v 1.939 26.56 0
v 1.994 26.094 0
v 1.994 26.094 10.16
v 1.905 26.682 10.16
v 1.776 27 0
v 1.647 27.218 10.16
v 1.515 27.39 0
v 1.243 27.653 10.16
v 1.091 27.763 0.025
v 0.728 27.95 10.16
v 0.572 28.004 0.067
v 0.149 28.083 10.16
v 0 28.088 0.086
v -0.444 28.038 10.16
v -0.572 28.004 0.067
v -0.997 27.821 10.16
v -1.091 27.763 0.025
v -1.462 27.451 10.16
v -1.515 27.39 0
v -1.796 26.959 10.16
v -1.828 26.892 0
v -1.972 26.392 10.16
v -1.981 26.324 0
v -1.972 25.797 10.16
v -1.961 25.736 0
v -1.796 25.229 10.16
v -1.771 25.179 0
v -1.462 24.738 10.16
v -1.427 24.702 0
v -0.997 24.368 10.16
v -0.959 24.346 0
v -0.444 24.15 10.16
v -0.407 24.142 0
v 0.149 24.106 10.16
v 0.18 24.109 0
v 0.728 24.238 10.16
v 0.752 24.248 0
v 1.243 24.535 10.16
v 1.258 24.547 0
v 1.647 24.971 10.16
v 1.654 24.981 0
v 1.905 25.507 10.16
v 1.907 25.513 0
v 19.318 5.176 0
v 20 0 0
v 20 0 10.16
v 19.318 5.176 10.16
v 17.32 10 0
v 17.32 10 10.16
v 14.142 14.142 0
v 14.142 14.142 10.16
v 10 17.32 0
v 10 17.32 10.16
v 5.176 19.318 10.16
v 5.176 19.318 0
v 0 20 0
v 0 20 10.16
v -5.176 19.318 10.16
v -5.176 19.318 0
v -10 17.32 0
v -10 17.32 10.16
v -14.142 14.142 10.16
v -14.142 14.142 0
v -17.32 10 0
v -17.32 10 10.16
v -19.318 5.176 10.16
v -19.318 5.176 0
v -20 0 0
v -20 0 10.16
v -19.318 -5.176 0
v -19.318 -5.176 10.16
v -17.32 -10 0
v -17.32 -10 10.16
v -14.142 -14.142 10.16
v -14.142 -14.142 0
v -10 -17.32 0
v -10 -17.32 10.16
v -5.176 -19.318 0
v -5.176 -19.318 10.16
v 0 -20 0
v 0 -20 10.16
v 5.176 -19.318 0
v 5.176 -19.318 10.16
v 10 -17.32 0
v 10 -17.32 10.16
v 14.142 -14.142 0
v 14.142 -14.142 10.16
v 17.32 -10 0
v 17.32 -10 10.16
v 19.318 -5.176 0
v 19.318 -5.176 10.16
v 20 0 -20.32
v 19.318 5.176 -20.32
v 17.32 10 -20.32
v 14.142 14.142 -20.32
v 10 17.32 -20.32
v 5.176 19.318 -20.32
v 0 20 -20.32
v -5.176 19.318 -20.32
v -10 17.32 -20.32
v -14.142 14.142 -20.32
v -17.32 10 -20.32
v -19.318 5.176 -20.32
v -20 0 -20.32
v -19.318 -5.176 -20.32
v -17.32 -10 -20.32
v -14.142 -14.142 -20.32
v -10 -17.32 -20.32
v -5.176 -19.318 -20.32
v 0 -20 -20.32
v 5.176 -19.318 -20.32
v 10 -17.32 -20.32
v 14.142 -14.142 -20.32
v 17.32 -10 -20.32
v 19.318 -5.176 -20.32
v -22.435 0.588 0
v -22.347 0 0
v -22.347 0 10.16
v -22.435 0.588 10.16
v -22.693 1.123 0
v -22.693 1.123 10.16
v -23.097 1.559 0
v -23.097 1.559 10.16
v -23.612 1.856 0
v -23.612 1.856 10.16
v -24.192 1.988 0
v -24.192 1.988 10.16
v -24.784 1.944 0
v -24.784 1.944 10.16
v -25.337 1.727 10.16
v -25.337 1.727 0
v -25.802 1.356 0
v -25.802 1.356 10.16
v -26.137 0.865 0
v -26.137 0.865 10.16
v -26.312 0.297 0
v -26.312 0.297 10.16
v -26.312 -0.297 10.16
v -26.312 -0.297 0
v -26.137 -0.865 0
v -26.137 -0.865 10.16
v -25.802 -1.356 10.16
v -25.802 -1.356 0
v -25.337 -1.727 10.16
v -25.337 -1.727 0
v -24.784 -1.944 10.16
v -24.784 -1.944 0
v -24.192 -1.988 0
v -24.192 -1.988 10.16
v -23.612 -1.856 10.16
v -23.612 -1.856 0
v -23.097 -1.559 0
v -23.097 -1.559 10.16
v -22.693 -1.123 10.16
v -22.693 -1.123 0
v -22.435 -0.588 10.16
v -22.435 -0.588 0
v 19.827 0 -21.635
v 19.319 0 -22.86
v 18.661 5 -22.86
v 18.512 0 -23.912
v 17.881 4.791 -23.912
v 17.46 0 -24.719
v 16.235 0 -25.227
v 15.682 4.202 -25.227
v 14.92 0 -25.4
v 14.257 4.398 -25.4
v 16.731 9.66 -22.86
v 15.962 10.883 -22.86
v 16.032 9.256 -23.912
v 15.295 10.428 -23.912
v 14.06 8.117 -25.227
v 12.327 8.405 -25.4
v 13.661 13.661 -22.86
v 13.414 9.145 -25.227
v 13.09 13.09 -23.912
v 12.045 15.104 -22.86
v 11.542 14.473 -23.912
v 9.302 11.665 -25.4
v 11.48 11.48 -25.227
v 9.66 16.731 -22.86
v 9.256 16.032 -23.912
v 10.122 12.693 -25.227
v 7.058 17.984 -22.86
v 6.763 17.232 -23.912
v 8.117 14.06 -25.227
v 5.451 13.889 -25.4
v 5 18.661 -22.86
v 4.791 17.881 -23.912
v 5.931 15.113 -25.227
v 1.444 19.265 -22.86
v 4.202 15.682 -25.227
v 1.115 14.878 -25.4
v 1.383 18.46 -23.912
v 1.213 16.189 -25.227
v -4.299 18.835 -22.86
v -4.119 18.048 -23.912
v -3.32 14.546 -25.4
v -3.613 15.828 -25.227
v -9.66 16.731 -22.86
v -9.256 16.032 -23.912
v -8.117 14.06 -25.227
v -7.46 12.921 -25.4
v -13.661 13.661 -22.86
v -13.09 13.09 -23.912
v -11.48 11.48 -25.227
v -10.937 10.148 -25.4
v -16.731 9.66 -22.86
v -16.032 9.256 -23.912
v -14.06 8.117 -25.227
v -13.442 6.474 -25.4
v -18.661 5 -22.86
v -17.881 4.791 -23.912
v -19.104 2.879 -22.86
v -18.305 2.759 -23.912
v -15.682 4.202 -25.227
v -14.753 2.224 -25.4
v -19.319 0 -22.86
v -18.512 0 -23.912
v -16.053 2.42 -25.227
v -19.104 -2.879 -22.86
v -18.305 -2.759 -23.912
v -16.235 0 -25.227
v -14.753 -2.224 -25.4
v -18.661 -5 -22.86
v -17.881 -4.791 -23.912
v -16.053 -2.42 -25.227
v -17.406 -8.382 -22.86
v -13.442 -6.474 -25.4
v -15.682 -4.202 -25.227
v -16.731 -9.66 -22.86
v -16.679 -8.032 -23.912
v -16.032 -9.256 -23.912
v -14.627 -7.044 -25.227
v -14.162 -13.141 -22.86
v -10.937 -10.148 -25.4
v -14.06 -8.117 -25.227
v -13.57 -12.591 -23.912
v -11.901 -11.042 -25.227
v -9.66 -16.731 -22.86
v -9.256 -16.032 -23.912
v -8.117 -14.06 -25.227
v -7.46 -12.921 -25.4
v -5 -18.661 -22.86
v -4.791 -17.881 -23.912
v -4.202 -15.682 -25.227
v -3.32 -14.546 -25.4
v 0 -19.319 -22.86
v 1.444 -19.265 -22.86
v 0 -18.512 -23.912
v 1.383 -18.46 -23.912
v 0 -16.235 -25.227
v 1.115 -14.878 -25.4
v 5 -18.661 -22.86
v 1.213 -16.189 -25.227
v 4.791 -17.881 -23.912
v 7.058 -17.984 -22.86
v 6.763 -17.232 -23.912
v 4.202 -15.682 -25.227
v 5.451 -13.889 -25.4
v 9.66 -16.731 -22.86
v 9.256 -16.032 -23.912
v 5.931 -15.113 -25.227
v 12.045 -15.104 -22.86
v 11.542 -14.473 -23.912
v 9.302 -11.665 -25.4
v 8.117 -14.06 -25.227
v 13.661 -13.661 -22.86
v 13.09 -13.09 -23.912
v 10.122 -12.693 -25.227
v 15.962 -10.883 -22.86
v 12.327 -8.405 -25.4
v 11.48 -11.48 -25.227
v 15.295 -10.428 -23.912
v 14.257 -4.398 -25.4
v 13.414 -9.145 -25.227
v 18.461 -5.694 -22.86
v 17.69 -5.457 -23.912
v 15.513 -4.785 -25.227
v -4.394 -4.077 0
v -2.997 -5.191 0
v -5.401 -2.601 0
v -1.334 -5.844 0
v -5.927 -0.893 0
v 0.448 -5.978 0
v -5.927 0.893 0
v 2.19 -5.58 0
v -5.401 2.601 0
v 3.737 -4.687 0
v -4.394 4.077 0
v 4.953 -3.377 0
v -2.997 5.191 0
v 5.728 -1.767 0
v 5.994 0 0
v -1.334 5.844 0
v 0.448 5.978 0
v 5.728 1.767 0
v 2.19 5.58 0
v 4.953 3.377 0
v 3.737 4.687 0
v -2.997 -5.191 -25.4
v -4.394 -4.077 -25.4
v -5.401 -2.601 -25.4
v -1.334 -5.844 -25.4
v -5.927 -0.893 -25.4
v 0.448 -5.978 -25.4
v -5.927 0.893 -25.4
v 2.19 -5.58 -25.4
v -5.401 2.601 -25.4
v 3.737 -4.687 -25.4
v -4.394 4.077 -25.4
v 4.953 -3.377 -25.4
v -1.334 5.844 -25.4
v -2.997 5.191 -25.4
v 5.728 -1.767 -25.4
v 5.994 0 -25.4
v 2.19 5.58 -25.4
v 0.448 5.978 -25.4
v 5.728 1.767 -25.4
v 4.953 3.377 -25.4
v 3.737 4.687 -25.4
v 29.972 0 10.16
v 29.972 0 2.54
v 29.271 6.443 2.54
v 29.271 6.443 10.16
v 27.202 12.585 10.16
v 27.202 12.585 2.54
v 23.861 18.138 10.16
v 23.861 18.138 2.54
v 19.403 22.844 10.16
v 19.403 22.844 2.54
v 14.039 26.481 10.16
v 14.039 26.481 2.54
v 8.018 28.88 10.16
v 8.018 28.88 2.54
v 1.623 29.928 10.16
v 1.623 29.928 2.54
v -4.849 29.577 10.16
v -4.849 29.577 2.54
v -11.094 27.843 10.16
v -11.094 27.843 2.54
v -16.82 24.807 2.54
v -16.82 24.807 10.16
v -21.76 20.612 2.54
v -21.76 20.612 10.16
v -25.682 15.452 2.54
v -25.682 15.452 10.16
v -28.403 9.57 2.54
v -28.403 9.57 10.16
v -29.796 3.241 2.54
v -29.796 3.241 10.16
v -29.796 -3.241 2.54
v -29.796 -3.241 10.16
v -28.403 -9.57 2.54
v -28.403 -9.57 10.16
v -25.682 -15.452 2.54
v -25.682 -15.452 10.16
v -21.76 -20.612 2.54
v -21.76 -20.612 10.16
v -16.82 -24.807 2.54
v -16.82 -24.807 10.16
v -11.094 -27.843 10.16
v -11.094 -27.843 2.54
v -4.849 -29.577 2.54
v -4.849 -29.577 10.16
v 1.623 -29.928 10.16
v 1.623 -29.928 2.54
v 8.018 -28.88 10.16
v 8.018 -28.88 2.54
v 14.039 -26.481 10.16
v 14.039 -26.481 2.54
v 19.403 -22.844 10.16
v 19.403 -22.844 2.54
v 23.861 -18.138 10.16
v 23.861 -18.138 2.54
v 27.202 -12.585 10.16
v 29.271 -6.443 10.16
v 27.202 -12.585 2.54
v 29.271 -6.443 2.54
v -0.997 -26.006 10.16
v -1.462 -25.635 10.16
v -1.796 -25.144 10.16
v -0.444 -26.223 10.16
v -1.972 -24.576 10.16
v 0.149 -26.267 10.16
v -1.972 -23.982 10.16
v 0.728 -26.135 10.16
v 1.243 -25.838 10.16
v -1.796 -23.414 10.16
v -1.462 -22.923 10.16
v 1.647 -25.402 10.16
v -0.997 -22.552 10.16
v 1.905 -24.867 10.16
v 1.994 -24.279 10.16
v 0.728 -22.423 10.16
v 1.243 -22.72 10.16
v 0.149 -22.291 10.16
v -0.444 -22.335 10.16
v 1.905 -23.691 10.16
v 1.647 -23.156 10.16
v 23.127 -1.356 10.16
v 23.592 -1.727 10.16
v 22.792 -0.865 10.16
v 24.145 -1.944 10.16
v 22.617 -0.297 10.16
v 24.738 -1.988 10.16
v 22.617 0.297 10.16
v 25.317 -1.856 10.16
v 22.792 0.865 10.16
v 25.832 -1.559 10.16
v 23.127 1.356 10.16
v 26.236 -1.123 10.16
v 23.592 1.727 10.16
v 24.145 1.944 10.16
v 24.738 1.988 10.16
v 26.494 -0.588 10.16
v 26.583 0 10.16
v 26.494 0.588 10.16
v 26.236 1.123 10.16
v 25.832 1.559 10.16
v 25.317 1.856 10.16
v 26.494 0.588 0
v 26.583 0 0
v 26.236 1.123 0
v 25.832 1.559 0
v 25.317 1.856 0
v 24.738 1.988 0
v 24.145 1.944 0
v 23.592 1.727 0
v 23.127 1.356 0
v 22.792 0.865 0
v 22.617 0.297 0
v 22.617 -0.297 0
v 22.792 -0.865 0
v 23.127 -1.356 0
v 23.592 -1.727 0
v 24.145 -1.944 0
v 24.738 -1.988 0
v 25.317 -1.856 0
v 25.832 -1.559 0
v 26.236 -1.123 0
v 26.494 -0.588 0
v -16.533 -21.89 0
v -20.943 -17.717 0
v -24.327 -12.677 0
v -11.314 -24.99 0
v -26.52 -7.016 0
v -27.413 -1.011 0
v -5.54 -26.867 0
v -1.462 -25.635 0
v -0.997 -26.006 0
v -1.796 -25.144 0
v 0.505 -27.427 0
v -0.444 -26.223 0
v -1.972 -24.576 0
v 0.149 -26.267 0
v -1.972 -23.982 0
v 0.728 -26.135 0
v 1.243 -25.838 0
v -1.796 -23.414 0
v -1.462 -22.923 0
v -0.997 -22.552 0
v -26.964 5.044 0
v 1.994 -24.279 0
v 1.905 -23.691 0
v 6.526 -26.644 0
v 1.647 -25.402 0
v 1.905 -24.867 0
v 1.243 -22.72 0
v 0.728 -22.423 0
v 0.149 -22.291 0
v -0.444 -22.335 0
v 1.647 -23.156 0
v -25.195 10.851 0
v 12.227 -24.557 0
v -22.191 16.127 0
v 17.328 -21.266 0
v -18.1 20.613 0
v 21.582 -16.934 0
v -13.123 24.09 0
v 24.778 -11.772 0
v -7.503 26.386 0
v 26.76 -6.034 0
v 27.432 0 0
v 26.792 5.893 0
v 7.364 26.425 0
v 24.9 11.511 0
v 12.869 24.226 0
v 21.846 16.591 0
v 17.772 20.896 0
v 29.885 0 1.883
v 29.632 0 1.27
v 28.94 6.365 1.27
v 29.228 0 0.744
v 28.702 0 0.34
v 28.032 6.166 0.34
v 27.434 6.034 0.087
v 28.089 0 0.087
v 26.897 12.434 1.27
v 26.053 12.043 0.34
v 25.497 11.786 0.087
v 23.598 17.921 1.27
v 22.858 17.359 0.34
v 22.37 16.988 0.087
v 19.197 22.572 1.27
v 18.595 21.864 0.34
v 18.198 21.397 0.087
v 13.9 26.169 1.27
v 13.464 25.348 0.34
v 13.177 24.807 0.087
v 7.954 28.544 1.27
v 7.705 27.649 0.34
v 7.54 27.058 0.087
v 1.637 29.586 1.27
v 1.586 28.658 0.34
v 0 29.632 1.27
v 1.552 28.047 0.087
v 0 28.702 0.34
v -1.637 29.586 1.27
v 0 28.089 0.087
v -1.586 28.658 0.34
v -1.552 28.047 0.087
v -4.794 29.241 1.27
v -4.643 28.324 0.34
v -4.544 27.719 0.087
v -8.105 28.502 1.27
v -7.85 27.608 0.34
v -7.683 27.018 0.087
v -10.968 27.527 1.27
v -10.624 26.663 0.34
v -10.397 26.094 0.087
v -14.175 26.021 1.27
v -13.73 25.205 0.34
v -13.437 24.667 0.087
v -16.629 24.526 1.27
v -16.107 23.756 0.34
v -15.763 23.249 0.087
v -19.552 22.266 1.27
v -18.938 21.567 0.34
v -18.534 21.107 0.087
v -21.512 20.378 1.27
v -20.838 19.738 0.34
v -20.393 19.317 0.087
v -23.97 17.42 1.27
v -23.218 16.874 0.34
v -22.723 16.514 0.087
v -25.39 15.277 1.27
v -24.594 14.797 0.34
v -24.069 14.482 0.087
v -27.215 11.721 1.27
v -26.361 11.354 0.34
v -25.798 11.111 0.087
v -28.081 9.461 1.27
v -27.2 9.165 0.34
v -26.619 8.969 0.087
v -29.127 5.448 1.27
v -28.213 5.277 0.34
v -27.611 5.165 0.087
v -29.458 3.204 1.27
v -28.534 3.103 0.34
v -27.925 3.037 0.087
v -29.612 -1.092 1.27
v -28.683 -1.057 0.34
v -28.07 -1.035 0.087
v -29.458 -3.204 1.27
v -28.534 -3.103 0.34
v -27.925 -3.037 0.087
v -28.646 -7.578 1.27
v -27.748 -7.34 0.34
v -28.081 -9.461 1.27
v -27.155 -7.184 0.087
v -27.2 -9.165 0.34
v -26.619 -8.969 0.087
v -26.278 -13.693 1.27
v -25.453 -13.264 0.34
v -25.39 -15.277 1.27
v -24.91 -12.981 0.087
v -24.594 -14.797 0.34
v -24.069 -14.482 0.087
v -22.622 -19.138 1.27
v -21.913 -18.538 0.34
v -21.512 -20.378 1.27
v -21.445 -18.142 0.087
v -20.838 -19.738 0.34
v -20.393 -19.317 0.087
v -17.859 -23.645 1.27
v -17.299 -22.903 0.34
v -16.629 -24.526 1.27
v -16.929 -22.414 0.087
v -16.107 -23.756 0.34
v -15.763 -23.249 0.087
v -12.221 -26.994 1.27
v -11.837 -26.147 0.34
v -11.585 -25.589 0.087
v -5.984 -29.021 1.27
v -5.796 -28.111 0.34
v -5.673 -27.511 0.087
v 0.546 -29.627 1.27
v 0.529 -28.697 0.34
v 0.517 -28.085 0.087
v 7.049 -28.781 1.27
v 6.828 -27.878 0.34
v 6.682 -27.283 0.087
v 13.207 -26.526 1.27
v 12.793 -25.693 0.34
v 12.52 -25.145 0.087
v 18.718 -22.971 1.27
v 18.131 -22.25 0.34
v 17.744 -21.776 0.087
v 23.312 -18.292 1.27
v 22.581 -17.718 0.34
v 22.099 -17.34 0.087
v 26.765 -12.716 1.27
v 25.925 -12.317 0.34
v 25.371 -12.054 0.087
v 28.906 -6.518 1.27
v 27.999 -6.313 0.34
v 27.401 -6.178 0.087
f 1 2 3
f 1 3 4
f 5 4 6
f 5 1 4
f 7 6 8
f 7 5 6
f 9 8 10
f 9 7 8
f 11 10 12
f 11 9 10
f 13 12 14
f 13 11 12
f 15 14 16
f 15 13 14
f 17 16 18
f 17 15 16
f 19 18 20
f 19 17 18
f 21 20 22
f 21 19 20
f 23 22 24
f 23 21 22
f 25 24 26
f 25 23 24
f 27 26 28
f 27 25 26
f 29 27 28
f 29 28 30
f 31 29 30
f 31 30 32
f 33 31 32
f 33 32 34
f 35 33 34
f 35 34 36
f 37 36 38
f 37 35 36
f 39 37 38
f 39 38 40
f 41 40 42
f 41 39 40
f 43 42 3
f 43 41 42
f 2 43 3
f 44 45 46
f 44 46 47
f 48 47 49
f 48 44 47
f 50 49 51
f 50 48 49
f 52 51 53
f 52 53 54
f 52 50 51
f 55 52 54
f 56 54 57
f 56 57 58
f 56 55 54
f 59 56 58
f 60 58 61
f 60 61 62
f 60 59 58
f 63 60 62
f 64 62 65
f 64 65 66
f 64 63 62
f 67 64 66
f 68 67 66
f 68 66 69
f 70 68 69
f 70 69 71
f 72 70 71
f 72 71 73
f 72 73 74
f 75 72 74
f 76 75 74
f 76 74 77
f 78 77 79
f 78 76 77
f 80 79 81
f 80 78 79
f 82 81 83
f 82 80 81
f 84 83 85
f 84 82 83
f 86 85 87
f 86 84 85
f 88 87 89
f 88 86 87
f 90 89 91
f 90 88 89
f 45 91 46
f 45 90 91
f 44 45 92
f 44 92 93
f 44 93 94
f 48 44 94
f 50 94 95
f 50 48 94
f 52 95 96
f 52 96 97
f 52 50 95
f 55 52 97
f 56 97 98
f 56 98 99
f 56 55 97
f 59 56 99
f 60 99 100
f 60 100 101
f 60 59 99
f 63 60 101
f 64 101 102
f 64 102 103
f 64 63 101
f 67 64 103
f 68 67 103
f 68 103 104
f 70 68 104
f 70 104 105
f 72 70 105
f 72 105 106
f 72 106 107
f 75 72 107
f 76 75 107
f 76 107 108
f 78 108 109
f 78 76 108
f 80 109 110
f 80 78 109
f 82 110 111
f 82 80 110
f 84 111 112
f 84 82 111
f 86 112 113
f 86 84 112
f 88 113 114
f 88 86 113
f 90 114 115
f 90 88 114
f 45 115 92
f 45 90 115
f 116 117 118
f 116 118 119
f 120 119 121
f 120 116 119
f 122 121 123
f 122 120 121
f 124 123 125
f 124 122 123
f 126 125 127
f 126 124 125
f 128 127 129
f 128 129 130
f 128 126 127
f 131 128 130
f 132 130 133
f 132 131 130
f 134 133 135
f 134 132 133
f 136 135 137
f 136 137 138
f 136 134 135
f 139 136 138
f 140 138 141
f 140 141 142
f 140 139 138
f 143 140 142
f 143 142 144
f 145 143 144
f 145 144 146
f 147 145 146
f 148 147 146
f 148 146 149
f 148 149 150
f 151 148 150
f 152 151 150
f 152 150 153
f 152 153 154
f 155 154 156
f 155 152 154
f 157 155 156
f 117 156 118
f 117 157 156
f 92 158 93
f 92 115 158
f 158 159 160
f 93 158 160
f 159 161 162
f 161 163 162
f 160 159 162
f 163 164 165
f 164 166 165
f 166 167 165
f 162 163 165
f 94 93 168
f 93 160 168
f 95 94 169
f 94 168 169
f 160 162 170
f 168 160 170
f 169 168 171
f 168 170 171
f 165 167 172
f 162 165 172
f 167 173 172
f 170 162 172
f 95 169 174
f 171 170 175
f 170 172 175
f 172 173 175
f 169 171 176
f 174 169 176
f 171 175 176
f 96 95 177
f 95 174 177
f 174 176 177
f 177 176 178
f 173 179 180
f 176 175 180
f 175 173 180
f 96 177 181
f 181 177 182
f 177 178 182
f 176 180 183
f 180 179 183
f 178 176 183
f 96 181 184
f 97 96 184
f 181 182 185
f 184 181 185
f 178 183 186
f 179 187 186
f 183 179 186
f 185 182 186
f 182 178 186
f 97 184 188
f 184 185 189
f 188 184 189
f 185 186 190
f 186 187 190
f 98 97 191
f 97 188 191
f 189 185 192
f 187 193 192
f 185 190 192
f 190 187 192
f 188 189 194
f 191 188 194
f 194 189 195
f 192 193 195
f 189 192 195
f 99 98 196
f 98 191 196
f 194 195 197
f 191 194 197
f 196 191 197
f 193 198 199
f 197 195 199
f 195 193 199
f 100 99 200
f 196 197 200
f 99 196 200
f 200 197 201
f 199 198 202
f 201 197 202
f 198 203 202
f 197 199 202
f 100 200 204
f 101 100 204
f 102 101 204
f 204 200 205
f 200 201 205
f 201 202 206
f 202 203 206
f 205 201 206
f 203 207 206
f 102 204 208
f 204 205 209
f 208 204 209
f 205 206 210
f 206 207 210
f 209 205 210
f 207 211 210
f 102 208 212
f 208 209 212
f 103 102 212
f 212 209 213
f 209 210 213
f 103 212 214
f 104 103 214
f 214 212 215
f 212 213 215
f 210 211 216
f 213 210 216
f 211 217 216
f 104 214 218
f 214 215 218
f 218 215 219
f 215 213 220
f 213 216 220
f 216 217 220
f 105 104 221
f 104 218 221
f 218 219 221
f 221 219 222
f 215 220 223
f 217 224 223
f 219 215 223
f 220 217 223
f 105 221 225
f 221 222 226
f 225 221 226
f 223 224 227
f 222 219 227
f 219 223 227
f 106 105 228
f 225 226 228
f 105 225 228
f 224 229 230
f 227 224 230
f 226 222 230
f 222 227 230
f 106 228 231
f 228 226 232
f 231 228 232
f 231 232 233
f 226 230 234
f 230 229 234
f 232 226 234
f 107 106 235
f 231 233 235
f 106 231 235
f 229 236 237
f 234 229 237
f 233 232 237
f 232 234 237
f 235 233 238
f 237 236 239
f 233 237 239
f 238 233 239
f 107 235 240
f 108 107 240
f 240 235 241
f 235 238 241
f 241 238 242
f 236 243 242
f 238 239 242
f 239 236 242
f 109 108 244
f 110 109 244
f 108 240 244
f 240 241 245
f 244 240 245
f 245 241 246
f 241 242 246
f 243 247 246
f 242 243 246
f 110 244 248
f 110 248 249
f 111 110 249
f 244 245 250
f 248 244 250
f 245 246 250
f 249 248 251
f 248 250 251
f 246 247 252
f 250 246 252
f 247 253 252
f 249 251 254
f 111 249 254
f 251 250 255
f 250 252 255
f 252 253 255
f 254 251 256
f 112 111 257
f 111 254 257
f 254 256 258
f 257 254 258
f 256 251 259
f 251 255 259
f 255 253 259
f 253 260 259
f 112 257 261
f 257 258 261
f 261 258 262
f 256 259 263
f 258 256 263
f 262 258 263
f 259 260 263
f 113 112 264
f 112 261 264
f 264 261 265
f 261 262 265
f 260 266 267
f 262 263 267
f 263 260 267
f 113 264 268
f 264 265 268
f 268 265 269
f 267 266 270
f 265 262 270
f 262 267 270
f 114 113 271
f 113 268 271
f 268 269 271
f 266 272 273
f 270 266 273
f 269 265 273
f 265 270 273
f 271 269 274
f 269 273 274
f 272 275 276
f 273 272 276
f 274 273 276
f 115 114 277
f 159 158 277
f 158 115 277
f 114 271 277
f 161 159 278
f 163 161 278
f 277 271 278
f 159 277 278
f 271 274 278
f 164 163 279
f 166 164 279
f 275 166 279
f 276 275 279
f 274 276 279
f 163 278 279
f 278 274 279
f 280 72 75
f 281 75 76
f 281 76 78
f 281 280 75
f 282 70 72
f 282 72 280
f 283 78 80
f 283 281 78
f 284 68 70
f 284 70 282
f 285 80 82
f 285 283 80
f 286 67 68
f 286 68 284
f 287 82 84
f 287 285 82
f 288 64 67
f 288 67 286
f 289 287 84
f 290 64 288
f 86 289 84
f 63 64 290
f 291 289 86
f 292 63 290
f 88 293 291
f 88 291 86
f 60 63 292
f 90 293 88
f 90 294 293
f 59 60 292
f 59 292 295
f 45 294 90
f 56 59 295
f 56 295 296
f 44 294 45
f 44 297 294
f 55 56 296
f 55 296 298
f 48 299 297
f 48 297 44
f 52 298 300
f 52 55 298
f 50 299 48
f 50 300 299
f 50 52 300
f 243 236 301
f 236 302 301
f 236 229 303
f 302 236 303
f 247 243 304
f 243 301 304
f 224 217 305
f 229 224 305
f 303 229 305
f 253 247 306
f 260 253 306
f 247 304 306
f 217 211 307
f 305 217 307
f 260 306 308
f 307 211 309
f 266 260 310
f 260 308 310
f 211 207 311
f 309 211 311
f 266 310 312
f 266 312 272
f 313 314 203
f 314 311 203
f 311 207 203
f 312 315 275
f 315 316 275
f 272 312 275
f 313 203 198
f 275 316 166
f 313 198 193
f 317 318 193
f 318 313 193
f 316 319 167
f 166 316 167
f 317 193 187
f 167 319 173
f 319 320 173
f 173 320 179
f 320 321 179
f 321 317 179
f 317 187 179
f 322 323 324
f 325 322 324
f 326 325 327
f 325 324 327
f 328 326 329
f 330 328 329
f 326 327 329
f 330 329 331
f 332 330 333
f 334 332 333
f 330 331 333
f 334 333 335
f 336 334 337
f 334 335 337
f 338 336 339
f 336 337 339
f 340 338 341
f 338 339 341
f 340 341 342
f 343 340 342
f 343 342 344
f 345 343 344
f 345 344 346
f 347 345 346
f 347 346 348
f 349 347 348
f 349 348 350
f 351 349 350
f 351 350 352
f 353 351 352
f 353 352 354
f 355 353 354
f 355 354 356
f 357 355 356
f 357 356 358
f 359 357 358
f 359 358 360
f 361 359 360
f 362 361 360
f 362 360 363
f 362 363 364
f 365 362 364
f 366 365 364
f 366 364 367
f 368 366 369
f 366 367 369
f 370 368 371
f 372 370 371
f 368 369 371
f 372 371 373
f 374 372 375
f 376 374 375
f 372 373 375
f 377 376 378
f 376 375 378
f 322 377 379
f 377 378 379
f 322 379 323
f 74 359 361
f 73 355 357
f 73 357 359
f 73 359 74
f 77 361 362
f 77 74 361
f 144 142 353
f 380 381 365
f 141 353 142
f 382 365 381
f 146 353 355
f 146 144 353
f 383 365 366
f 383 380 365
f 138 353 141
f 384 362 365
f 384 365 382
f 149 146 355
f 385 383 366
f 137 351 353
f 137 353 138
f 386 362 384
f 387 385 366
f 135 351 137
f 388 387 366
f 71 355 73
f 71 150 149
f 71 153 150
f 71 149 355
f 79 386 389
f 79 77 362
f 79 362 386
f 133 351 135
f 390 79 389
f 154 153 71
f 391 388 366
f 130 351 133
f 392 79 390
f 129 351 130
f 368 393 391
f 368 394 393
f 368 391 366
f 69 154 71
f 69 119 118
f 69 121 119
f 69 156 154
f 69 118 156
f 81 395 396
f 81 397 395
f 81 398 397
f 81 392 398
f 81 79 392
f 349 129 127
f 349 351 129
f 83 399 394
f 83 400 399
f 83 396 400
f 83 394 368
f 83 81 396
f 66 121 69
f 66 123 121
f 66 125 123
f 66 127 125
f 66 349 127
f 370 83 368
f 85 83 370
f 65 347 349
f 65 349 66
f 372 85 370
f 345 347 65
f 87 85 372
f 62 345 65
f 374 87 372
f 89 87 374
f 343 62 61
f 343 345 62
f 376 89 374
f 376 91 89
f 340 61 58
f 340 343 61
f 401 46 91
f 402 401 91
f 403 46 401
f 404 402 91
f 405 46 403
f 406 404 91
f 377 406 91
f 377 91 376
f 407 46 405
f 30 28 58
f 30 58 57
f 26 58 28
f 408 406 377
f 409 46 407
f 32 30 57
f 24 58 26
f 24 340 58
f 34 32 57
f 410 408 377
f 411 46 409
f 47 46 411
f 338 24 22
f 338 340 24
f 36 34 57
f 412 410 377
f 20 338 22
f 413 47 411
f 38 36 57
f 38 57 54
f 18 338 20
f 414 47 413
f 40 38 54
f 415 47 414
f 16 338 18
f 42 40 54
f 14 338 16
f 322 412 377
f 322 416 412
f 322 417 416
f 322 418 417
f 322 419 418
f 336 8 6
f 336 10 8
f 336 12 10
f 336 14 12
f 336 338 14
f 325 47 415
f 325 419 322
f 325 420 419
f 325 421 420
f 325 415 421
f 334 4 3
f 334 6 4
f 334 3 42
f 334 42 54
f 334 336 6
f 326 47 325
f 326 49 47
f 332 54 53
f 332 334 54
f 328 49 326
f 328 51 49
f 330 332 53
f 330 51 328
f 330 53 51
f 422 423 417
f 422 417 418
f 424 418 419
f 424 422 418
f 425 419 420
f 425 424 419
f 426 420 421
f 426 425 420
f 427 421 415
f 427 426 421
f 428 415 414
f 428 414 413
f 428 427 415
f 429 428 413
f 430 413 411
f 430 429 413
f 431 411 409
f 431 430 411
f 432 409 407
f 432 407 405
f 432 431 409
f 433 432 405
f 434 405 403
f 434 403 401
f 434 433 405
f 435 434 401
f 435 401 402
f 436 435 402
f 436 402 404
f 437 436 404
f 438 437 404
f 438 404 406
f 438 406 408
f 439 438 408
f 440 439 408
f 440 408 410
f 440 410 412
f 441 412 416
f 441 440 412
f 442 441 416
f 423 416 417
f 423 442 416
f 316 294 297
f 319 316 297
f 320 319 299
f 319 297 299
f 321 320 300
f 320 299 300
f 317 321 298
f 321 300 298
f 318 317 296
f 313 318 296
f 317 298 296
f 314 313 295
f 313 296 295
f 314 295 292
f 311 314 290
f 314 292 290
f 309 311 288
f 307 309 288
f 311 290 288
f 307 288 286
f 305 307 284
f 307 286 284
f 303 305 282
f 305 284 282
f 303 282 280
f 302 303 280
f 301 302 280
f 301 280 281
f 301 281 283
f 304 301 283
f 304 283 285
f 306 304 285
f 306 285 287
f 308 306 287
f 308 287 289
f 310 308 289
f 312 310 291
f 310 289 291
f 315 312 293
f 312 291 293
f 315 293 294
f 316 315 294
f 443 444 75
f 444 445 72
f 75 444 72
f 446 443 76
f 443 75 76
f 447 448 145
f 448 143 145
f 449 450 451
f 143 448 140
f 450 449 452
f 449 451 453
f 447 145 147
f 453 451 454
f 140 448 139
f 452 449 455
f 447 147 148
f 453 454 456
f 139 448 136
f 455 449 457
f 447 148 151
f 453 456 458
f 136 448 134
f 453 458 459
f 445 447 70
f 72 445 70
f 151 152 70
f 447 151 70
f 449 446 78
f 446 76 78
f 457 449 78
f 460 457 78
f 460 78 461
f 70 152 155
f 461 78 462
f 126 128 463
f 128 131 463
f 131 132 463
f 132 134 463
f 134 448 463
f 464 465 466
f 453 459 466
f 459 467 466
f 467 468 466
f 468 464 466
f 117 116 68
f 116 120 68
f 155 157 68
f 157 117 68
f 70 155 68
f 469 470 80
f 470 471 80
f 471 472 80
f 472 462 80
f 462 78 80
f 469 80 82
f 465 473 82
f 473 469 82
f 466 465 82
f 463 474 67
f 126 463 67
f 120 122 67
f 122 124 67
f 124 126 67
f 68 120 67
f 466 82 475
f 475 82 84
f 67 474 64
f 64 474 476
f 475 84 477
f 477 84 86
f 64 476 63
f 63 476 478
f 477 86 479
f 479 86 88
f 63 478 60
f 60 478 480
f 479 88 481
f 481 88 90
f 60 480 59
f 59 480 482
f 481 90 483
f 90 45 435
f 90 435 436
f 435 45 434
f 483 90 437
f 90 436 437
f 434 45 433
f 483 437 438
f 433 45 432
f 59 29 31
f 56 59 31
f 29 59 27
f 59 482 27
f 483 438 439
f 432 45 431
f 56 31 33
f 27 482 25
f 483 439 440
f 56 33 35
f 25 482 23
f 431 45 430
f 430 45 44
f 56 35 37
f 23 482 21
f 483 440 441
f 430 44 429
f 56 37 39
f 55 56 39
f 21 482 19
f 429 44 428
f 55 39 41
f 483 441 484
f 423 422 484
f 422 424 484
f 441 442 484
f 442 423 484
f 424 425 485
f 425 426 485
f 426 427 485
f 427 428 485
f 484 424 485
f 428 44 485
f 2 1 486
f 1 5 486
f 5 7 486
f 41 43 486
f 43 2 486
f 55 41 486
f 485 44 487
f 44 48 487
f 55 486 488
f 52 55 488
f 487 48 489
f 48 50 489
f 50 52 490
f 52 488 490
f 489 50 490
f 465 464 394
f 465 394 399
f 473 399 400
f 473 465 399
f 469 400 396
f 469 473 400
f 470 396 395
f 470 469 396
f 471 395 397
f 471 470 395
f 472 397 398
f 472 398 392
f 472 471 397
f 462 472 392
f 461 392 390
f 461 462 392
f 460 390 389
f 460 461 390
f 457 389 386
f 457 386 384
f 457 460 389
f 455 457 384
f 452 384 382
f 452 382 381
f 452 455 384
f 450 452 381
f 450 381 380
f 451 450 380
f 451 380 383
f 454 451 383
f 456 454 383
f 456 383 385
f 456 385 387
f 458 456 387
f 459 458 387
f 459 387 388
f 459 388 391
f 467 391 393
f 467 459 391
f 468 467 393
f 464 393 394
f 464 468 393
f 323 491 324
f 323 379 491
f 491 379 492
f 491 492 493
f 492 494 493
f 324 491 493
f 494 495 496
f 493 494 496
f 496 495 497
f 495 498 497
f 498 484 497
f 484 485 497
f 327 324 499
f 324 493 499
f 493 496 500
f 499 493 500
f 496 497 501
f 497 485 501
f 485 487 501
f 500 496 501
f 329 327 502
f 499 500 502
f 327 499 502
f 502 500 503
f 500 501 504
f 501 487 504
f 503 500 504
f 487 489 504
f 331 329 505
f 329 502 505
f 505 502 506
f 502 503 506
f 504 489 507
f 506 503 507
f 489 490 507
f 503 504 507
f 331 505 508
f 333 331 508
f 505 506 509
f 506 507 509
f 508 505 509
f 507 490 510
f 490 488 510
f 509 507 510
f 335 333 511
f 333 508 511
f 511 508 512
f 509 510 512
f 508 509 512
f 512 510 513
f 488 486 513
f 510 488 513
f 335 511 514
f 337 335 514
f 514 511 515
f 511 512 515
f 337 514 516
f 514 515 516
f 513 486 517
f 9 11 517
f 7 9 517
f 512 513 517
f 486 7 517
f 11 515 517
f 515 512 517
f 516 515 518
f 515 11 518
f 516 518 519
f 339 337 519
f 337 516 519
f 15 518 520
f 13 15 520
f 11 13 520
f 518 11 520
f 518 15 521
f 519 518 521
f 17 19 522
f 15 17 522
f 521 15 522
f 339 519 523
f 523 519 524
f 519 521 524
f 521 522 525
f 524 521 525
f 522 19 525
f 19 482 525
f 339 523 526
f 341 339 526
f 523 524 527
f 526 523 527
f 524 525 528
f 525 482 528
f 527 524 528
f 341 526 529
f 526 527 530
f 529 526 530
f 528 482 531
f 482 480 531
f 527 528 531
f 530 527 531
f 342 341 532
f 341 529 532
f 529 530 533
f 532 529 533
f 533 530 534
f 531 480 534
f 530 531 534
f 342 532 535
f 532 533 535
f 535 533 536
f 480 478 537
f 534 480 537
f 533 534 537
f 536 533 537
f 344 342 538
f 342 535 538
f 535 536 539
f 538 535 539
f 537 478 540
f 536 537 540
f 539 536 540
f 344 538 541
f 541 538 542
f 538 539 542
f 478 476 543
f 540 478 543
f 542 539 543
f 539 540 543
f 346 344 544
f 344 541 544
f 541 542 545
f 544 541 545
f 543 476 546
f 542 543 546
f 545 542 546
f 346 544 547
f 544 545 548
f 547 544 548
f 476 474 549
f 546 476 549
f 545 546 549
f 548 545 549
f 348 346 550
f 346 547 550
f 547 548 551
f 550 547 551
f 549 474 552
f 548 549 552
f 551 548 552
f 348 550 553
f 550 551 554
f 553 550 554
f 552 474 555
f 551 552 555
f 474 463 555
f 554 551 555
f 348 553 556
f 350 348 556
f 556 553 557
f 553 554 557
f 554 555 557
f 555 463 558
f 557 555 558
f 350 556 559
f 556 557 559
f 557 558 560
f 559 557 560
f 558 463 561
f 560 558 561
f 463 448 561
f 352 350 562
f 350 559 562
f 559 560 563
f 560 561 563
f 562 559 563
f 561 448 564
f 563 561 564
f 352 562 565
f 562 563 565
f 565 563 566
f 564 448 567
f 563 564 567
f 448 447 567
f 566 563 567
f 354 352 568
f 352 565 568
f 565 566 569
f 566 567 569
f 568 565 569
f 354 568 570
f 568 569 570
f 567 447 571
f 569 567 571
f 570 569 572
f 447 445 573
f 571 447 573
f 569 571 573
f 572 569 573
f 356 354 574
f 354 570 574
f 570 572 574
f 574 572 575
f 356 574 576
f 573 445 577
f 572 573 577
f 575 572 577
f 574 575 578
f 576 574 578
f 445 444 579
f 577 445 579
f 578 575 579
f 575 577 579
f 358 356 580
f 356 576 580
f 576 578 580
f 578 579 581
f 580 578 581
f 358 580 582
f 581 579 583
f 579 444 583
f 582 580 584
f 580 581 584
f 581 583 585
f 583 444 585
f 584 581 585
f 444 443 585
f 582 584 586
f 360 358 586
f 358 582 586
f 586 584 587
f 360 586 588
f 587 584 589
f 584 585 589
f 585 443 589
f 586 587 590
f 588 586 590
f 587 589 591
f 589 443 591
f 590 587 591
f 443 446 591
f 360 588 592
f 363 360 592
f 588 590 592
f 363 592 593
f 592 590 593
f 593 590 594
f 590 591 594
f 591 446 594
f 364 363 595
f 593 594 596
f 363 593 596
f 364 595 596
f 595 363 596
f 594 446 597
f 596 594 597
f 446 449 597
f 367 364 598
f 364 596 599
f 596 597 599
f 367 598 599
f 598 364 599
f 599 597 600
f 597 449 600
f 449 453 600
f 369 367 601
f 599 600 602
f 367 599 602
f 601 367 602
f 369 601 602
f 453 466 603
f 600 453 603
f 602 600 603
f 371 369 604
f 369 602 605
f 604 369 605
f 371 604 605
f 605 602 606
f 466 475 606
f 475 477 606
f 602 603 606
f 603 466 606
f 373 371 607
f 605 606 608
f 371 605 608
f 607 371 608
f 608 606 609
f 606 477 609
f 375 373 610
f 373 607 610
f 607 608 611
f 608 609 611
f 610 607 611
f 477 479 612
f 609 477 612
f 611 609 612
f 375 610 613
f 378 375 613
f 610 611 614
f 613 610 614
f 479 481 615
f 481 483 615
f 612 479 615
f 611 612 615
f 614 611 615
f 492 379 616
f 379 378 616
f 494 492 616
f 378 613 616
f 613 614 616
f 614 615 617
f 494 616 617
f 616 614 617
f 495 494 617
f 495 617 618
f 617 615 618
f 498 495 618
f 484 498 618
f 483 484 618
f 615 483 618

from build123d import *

# Parameters (mm, degrees)
F0_R     = 19.99996
F0_R_2   = 5.9944
F1_DEPTH = 25.4
F0_R_3   = 29.972
F0_R_4   = 1.9939
F2_DEPTH = 10.16
F3_R     = 5.08


# Not quite as in the source:
# - a fillet or chamfer that OpenCascade refuses, or shapes differently, is made with other operations: its cross-section is extruded or revolved along the edge and cut away or added
# - a feature names something its author has since deleted; it is built from what else it names


with BuildPart() as f1:
    # F0 (on Top) → F1 (new body)
    with BuildSketch(Plane.XY):
        Circle(F0_R)
        Circle(F0_R_2, mode=Mode.SUBTRACT)
    extrude(amount=-F1_DEPTH)

    # F3
    f3_edges = [f1.edges().sort_by_distance(p)[0] for p in [
        (-19.99996, 0, -25.4),
    ]]
    fillet(f3_edges, radius=F3_R)


with BuildPart() as f2:
    # F0 (on Top) → F2 (new body)
    with BuildSketch(Plane.XY):
        Circle(F0_R_3)
        with Locations((0, -24.2790300399)):
            Circle(F0_R_4, mode=Mode.SUBTRACT)
        with Locations((-24.3405103683, 0)):
            Circle(F0_R_4, mode=Mode.SUBTRACT)
        Circle(F0_R, mode=Mode.SUBTRACT)
        with Locations((24.5888829231, 0)):
            Circle(F0_R_4, mode=Mode.SUBTRACT)
        with Locations((0, 26.0943584144)):
            Circle(F0_R_4, mode=Mode.SUBTRACT)
    extrude(amount=F2_DEPTH)

    # F4: fillet of radius 2.54 on 1 edges, made by hand

    # F4_s1 → F4_t2 (revolve, cut)
    with BuildSketch(Plane.XZ):
        with BuildLine():
            ThreePointArc((29.972, 2.54), (29.2280512242, 0.7439487758), (27.432, 0))
            Line((27.432, 0), (29.972, 0))
            Line((29.972, 0), (29.972, 2.54))
        make_face()
    revolve(axis=Axis((0, 0, 0), (0, 0, 1)), mode=Mode.SUBTRACT)


solid = Compound([f1.part, f2.part])
